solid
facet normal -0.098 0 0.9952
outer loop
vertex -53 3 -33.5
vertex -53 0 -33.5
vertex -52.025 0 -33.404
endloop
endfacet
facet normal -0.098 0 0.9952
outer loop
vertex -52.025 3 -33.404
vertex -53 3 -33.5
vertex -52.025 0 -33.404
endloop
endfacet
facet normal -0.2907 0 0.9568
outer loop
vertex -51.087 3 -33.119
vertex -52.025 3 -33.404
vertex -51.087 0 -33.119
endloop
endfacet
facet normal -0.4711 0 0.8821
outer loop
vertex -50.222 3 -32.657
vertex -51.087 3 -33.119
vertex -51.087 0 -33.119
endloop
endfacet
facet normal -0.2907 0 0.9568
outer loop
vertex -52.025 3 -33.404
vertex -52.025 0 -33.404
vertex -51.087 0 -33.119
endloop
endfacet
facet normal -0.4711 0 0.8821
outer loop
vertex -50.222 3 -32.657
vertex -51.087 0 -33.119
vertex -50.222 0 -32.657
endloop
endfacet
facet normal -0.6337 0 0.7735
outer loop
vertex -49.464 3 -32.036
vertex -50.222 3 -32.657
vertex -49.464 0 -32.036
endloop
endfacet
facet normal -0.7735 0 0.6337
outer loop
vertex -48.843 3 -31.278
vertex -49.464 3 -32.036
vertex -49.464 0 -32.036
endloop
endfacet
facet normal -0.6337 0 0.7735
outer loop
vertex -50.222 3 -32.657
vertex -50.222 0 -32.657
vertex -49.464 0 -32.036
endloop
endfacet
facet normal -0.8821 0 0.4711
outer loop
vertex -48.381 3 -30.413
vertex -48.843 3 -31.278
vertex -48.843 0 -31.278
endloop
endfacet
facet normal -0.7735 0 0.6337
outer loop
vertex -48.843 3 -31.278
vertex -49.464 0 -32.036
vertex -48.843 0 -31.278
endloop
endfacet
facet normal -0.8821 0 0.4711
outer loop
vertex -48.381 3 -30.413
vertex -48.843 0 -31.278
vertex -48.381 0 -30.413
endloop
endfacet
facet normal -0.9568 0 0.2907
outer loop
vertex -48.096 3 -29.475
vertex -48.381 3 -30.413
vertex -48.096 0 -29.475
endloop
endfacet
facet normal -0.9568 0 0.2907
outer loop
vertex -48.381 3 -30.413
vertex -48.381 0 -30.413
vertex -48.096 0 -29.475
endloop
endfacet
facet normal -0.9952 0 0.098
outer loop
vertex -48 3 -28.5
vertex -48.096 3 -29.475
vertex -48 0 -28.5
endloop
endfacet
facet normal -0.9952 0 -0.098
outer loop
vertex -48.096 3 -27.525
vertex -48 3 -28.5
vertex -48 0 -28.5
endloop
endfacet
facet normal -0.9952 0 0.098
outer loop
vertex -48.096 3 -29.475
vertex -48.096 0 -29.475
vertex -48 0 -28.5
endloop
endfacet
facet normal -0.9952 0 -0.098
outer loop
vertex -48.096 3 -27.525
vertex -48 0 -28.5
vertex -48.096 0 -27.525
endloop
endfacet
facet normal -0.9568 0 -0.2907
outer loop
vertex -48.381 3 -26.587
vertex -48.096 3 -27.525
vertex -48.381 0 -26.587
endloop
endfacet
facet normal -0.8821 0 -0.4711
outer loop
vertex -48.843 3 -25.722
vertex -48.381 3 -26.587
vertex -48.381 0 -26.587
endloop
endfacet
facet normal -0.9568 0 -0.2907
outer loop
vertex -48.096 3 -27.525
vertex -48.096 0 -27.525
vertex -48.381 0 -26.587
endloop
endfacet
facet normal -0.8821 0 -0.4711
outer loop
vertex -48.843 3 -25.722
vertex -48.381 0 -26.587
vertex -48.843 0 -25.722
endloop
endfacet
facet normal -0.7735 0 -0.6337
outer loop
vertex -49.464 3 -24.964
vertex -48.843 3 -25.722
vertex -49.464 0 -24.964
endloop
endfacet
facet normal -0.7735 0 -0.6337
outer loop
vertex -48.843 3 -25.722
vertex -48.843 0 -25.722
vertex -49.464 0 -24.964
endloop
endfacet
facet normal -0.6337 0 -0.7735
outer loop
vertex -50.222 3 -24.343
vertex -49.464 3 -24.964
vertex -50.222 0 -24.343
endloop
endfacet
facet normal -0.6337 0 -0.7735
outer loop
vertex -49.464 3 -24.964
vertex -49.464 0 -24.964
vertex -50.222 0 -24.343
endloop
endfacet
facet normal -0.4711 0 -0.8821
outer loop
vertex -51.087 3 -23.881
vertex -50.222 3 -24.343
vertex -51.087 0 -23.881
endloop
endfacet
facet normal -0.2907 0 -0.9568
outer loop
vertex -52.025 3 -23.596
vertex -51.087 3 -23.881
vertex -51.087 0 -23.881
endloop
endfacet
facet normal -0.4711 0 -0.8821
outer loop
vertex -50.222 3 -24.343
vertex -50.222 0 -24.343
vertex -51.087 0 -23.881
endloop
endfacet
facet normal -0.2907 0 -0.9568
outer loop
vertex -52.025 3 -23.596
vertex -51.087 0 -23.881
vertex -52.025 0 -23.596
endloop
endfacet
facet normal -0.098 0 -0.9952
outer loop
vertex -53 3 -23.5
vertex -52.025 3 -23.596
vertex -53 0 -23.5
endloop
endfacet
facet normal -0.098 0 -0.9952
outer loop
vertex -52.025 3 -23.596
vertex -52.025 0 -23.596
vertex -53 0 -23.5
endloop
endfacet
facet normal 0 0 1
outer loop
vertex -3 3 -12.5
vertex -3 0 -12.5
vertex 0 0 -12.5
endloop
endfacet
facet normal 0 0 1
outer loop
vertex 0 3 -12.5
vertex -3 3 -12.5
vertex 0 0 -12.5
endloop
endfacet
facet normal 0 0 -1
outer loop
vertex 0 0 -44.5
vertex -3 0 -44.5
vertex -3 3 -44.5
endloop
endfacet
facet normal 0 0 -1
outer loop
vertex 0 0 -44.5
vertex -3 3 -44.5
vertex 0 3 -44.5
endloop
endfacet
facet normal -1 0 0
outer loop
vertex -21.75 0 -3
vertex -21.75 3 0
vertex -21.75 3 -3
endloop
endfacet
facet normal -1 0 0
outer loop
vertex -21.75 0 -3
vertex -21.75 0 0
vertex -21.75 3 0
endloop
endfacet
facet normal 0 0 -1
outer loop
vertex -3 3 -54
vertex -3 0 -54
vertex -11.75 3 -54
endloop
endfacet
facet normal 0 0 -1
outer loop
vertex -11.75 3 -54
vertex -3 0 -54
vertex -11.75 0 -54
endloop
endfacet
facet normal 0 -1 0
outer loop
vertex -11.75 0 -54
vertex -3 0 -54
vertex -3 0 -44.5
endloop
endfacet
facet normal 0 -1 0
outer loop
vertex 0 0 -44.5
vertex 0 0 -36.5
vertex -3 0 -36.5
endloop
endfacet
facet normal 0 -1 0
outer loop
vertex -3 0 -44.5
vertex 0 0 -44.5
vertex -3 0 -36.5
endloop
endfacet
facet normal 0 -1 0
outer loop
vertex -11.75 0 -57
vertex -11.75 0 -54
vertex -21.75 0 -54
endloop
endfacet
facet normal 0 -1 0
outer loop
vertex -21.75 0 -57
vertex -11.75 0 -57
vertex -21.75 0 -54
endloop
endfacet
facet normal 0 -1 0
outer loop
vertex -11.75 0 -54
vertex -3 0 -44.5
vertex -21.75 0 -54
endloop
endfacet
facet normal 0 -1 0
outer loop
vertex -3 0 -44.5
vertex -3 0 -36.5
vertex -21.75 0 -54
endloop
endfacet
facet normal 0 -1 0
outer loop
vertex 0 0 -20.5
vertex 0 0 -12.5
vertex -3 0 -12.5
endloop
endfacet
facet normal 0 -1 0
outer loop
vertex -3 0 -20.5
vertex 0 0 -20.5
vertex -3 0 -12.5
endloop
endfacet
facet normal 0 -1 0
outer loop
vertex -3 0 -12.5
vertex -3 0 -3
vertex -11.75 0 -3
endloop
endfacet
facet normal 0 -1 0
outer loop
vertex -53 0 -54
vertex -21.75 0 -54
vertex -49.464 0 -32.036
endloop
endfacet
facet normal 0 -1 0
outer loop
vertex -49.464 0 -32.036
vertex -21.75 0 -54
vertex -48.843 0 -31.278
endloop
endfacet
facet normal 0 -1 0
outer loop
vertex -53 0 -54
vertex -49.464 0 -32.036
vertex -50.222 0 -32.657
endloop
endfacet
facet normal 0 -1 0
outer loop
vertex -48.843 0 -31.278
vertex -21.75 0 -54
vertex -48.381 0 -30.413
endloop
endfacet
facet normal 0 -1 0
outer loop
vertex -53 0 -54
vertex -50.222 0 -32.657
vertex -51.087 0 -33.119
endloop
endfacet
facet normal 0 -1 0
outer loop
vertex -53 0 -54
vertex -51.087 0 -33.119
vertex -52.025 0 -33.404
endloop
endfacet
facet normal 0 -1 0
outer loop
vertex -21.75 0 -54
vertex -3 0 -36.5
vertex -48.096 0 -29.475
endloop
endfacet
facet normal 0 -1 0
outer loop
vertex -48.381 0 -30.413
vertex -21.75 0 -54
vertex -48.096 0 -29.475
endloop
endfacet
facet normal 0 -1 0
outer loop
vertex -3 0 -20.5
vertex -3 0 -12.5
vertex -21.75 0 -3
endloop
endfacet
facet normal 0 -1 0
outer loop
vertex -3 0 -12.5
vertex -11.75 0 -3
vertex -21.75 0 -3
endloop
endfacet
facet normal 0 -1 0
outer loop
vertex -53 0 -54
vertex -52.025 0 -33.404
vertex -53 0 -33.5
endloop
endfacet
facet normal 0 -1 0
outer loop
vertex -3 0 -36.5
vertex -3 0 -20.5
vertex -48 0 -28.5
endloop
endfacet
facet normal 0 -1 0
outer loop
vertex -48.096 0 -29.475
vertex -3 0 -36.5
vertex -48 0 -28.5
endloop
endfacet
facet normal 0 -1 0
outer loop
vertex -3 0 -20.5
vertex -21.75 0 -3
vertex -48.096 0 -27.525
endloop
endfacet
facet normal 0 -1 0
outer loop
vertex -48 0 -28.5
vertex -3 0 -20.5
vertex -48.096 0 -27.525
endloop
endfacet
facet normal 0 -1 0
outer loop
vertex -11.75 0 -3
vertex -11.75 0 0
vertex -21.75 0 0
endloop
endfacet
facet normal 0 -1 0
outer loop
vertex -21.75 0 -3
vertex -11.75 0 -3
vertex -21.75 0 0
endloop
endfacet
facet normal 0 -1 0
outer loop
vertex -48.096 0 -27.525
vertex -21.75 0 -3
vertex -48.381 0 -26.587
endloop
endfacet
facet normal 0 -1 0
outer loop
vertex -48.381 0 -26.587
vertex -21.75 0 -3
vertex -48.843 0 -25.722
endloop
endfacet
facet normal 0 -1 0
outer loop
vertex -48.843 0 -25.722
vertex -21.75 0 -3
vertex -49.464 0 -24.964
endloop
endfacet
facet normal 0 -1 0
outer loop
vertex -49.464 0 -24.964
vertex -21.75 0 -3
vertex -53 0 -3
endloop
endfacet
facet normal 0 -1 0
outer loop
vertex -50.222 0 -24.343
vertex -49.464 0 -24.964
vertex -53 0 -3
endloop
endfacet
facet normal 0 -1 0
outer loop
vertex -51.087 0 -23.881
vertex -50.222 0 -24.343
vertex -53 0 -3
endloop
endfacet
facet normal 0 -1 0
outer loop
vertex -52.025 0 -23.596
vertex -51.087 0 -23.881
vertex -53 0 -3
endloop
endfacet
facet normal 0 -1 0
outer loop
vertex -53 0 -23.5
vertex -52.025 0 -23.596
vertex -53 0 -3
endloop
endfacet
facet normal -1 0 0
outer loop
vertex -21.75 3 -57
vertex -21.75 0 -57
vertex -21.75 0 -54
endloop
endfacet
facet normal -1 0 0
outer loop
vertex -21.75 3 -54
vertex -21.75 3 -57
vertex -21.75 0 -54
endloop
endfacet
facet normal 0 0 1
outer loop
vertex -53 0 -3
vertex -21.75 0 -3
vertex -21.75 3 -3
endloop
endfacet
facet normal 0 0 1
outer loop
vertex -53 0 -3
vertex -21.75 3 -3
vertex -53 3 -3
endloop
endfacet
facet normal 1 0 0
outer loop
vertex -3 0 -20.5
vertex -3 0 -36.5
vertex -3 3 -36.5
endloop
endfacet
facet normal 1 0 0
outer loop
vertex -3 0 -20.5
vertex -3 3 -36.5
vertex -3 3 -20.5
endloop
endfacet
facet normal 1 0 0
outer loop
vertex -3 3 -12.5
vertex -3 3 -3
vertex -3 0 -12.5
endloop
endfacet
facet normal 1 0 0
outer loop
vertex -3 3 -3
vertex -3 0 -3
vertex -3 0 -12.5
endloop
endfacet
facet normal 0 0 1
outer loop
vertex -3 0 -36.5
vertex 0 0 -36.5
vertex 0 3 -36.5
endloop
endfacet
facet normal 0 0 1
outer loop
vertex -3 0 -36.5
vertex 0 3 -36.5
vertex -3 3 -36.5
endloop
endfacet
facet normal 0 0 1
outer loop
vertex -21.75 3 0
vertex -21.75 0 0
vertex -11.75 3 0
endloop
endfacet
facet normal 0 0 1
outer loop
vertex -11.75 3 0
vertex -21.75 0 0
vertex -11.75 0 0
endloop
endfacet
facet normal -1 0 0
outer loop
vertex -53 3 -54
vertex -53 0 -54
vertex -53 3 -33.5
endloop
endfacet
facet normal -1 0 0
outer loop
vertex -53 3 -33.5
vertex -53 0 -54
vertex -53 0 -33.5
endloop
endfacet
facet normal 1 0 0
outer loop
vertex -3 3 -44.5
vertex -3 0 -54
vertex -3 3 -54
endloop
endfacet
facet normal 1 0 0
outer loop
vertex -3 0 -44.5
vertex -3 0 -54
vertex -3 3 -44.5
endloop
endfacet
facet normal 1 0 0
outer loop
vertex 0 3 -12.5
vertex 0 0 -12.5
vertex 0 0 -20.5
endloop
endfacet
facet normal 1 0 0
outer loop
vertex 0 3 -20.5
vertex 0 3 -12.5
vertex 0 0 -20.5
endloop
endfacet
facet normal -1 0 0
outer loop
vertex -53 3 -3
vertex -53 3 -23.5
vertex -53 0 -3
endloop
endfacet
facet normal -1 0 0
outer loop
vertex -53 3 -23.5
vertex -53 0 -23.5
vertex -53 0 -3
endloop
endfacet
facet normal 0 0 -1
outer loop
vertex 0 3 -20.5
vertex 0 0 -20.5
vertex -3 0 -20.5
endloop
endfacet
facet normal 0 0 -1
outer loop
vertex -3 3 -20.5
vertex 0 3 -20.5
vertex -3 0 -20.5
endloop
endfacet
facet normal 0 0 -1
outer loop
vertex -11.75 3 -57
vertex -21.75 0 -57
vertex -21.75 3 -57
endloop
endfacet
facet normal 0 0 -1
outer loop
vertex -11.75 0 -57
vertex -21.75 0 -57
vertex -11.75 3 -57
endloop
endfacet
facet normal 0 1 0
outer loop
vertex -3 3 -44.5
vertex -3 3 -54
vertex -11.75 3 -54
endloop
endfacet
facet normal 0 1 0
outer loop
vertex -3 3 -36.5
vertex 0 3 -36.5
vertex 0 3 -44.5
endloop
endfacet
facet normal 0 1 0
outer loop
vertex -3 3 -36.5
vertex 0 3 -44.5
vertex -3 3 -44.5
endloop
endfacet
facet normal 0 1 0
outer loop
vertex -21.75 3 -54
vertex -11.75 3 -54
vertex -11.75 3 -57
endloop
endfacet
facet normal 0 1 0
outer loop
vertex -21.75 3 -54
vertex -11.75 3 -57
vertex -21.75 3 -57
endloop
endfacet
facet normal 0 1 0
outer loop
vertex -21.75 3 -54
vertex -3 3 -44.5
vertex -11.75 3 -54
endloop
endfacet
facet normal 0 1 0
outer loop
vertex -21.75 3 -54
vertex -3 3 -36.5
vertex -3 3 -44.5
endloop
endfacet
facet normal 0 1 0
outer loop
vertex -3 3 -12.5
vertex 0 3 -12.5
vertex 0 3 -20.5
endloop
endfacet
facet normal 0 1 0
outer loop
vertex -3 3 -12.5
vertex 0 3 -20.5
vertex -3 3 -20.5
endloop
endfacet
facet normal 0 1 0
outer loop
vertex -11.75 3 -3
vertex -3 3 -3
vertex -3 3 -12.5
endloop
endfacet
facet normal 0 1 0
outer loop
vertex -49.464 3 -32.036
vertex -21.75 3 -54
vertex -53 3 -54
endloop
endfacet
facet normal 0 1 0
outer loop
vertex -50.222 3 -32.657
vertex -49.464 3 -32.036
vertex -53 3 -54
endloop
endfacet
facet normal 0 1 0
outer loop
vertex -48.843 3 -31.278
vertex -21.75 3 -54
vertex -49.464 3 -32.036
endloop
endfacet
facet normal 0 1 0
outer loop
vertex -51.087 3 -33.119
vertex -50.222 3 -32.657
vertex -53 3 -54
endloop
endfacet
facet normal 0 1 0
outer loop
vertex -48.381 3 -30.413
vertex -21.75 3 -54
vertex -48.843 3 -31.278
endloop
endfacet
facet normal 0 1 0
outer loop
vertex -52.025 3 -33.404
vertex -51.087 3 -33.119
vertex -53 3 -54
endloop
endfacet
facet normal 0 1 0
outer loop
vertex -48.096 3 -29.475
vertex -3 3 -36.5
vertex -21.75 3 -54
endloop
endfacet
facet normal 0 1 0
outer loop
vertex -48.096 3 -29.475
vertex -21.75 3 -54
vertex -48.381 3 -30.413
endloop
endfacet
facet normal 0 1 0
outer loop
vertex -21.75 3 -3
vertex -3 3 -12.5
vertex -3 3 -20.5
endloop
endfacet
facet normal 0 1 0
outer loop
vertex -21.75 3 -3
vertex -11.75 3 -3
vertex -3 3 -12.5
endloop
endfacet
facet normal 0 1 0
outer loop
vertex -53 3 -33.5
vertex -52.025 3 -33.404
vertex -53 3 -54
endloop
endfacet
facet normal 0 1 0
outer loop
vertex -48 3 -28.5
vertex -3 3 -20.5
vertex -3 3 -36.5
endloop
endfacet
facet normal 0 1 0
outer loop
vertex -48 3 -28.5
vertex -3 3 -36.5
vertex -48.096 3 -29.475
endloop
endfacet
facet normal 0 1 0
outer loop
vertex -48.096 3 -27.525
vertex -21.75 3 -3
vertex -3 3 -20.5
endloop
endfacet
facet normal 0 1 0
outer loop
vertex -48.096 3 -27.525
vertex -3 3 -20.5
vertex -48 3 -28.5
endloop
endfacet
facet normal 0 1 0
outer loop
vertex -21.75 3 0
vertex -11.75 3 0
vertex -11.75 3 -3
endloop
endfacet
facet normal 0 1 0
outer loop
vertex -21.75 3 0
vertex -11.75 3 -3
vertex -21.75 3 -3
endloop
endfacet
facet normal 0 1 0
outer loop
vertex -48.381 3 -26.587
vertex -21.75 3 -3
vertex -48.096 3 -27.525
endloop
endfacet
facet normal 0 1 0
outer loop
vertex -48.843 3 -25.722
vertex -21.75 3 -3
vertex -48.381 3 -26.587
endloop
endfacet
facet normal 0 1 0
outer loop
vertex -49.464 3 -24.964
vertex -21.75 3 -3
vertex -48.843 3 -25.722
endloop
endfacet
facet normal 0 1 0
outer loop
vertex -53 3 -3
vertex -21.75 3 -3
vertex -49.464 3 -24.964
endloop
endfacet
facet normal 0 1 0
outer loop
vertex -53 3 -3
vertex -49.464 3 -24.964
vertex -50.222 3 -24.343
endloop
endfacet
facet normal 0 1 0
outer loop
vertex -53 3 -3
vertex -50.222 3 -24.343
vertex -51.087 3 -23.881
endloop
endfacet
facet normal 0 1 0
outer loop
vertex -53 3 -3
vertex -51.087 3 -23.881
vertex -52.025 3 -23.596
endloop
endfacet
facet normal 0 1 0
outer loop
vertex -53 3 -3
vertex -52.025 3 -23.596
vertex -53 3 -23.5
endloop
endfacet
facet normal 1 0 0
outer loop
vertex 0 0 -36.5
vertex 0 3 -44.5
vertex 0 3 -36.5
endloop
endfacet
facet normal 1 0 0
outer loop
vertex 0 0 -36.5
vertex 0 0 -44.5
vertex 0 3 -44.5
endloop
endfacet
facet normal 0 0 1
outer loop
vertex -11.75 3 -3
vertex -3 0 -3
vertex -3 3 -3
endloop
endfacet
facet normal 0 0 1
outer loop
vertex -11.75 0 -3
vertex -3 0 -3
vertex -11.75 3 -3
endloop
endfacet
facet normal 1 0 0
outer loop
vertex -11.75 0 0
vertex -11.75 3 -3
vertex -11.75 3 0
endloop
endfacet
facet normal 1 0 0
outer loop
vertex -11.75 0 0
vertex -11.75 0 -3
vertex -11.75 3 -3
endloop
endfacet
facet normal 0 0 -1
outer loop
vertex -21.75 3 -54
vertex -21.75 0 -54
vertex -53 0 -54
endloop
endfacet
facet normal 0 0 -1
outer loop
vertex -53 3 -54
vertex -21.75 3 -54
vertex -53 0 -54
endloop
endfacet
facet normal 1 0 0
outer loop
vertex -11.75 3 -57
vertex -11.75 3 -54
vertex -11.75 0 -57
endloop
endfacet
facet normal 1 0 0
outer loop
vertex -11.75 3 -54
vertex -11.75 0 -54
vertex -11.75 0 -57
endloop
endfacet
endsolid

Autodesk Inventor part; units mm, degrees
ref_plane "YZ Plane" through (0, 0, 0) normal (1, 0, 0) x (0, 1, 0)
ref_plane "XZ Plane" through (0, 0, 0) normal (0, 1, 0) x (-1, 0, 0)
sketch "Sketch1" plane through (0, 0, 0) normal (0, 1, 0) x (-1, 0, 0)
  line L0 (53, -54) -> (53, -3)
  line L1 (21.75, 0) -> (11.75, 0)
  line L2 (3, -3) -> (3, -12.5)
  line L3 (3, -12.5) -> (0, -12.5)
  line L4 (0, -12.5) -> (0, -20.5)
  line L5 (0, -20.5) -> (3, -20.5)
  line L6 (0, -28.5) -> (26.5, -28.5) construction
  line L7 (26.5, -28.5) -> (26.5, -57) construction
  line L8 (3, -20.5) -> (3, -28.5)
  line L9 (3, -54) -> (3, -44.5)
  line L10 (3, -44.5) -> (0, -44.5)
  line L11 (0, -44.5) -> (0, -36.5)
  line L12 (0, -36.5) -> (3, -36.5)
  line L13 (3, -36.5) -> (3, -28.5)
  line L14 (3, -3) -> (11.75, -3)
  line L15 (11.75, -3) -> (11.75, 0)
  line L16 (11.75, 0) -> (21.75, 0)
  line L17 (21.75, 0) -> (21.75, -3)
  line L18 (21.75, -3) -> (53, -3)
  line L19 (21.75, -57) -> (11.75, -57)
  line L20 (3, -54) -> (11.75, -54)
  line L21 (11.75, -54) -> (11.75, -57)
  line L22 (21.75, -57) -> (21.75, -54)
  line L23 (21.75, -54) -> (53, -54)
  point P0 (0, 0)
  dimension "d4" = 8
  dimension "d6" = 8.75
  dimension "d7" = 10
extrude "Extrusion1" add sketch "Sketch1" along normal blind 3
sketch "Sketch2" plane through (0, 0, 0) normal (0, -1, 0) x (1, 0, 0)
  line L0 (-53, -54) -> (-53, -3) projected
  arc A0 (-53, -33.5) -> (-53, -23.5) centre (-53, -28.5) ccw
  line L1 (-53, -33.5) -> (-53, -23.5)
  point P0 (0, 0)
  dimension "d10" = 10
ref_plane "Work Plane1" through (-57, 11.25, -57) normal (0, 1, 0) x (0, 0, 1)
extrude "Extrusion2" cut sketch "Sketch2" against normal up to surface (11.25 mm away)
properties part number "SoporteCircuito" material "Iron, Cast"
